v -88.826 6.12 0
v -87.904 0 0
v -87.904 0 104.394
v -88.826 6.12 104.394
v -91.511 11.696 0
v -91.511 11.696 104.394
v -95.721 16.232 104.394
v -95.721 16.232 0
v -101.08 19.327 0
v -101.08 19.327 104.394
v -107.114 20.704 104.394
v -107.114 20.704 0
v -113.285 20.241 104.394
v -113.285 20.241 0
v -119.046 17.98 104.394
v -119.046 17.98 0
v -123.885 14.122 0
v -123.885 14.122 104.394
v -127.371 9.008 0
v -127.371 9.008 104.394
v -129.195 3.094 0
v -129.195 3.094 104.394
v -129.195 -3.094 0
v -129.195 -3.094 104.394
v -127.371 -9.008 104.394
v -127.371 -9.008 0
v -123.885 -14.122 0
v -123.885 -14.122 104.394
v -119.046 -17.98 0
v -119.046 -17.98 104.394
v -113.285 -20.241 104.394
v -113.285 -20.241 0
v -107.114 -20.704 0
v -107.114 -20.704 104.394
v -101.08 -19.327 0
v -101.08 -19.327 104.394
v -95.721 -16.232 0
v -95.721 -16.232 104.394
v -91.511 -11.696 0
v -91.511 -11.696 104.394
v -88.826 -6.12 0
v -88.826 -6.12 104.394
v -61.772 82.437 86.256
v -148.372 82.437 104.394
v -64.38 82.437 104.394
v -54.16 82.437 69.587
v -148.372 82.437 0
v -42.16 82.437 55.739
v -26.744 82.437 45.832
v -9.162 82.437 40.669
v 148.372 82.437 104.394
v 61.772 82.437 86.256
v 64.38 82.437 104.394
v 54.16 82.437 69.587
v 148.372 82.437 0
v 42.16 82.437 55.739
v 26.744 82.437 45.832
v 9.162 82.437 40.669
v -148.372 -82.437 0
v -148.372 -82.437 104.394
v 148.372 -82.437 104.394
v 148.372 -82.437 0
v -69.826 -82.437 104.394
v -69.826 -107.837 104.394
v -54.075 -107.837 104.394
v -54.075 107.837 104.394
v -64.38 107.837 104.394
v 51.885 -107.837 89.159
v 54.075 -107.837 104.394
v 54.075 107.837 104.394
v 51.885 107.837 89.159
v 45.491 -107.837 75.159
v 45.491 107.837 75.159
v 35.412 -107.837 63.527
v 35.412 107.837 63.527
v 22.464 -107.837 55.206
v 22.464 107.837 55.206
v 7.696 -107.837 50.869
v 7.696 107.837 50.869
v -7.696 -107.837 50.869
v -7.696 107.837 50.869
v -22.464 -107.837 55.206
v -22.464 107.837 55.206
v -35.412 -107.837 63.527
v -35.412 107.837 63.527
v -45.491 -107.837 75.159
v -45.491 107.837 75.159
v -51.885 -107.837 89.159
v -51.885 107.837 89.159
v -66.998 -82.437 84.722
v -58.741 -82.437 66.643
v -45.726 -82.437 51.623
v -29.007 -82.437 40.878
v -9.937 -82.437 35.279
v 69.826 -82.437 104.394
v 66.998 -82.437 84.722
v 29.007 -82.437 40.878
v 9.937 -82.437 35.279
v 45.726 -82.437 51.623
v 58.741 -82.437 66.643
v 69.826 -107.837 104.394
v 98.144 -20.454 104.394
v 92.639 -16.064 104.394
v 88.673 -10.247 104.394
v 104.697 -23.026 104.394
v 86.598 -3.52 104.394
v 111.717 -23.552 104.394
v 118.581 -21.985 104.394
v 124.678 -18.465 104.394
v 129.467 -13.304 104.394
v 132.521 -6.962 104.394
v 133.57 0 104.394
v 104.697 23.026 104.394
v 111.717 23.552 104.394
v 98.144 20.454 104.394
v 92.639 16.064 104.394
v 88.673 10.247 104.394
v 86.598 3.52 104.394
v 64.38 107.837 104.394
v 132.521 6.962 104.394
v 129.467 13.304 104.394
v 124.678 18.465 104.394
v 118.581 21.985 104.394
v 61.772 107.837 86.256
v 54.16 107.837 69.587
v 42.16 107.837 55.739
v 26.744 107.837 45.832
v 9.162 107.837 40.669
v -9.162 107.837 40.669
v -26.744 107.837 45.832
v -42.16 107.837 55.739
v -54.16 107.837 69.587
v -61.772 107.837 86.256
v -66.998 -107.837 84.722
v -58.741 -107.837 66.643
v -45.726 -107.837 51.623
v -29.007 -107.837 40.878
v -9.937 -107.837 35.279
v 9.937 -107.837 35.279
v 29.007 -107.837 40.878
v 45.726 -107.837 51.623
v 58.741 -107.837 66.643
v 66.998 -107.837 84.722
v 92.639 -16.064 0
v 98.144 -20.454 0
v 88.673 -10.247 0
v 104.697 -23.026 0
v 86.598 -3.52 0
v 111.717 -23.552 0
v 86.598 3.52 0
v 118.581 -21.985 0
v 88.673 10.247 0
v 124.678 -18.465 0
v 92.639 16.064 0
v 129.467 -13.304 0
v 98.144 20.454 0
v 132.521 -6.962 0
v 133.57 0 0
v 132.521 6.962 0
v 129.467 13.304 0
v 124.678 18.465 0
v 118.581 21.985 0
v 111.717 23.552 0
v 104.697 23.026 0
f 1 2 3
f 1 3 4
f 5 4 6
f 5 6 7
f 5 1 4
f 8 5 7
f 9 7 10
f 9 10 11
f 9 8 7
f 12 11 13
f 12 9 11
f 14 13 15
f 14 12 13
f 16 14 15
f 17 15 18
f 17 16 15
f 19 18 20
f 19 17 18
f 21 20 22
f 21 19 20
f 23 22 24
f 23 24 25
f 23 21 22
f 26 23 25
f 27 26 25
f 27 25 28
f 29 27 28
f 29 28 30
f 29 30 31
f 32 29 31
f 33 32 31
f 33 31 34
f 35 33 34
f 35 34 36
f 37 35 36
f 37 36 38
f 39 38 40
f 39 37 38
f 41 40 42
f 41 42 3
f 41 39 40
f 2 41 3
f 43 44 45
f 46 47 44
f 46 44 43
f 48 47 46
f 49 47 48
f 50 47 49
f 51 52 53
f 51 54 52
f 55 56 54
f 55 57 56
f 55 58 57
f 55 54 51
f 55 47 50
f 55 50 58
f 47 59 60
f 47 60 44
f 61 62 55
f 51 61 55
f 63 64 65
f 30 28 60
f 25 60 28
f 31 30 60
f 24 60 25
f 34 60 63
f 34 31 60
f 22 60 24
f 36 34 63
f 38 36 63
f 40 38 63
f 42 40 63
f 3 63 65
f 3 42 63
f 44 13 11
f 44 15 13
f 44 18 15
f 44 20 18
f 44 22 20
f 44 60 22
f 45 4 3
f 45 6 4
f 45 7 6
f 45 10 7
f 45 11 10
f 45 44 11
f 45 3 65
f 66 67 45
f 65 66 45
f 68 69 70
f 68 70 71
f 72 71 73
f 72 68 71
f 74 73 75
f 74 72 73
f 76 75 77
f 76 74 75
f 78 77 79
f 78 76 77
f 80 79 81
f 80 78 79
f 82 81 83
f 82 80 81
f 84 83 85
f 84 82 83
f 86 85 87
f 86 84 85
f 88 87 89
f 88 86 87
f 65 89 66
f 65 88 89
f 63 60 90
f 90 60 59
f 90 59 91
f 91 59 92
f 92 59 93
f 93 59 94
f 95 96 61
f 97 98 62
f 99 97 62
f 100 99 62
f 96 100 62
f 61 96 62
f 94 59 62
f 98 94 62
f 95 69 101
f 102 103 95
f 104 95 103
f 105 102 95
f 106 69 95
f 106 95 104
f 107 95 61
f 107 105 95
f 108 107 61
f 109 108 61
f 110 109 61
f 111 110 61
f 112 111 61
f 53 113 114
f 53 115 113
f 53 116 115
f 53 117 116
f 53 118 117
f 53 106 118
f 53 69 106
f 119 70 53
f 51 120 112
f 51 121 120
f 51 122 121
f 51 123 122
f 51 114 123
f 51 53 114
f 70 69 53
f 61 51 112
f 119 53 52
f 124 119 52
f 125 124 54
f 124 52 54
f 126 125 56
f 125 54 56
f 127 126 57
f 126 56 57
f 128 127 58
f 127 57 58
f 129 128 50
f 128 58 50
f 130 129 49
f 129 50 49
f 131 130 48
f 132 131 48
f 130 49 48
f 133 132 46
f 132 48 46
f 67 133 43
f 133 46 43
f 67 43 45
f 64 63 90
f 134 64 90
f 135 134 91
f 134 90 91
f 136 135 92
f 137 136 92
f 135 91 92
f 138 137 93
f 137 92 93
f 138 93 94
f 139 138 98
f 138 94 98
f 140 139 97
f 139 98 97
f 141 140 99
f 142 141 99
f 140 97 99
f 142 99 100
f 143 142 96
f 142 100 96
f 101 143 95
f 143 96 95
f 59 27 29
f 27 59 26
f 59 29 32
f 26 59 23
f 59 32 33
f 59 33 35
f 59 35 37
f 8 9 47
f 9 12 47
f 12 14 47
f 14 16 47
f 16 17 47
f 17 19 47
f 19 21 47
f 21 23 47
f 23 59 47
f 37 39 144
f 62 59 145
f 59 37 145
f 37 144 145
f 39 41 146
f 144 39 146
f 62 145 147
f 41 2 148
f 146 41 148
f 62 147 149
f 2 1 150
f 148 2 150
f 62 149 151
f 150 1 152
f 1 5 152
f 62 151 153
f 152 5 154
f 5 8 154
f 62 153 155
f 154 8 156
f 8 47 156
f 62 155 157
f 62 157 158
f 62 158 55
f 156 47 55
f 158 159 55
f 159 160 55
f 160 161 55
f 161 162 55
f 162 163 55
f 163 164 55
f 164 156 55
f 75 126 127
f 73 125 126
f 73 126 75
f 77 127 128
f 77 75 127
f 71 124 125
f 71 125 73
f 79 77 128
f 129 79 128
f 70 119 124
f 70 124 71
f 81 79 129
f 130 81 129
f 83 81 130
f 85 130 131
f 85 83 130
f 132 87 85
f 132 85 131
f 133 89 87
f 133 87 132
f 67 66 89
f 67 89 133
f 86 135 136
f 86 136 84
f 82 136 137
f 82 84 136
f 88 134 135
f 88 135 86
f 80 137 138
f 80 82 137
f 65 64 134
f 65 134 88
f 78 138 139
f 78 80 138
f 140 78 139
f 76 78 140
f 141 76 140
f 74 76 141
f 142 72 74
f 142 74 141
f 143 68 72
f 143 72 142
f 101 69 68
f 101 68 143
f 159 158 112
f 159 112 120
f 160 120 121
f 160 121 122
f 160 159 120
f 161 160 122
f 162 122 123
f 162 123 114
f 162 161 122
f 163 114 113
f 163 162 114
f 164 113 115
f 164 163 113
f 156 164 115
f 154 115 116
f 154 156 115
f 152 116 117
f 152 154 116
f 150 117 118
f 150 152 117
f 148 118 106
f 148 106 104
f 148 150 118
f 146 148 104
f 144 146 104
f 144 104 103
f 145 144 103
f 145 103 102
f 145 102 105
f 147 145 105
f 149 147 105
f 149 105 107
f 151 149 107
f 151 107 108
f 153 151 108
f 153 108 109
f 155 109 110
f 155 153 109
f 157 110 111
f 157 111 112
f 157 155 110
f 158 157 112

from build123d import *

# Parameters (mm, degrees)
F0_W     = 296.7444360256
F0_H     = 164.8739129305
F0_R     = 20.7617734551
F0_R_2   = 23.6179830604
F1_DEPTH = 104.394
F3_DEPTH = 25.4
F5_DEPTH = 25.4
F6_DEPTH = 237.998


with BuildPart() as f1:
    # F0 (on Top) → F1 (new body)
    with BuildSketch(Plane.XY):
        Rectangle(F0_W, F0_H)
        with Locations((-108.6655110121, 0)):
            Circle(F0_R, mode=Mode.SUBTRACT)
        with Locations((109.9524945021, 0)):
            Circle(F0_R_2, mode=Mode.SUBTRACT)
    extrude(amount=F1_DEPTH)

    # F2 (on face) → F3 (join)
    with BuildSketch(Plane.XZ.offset(82.4369564652)):
        with BuildLine():
            ThreePointArc((-69.8260508727, 104.394), (0, 34.5679491273), (69.8260508727, 104.394))
            Line((69.8260508727, 104.394), (54.0751636947, 104.394))
            ThreePointArc((54.0751636947, 104.394), (0, 50.3188363053), (-54.0751636947, 104.394))
            Line((-54.0751636947, 104.394), (-69.8260508727, 104.394))
        make_face()
    extrude(amount=F3_DEPTH)

    # F4 (on face) → F5 (join)
    with BuildSketch(Plane(origin=(0, 82.4369564652, 0), x_dir=(-1, 0, 0), z_dir=(0, 1, 0))):
        with BuildLine():
            Line((64.3801944151, 104.394), (53.3518843102, 104.394))
            ThreePointArc((53.3518843102, 104.394), (0, 51.0421156898), (-53.3518843102, 104.394))
            Line((-53.3518843102, 104.394), (-64.3801944151, 104.394))
            ThreePointArc((-64.3801944151, 104.394), (0, 40.0138055849), (64.3801944151, 104.394))
        make_face()
    extrude(amount=F5_DEPTH)

    # F6 (cut): a face of the model
    f6_faces = [f1.faces().sort_by_distance(p)[0] for p in [
        (0, -82.4369564652, 81.443787732),
    ]]
    extrude(f6_faces, amount=-F6_DEPTH, mode=Mode.SUBTRACT)


solid = f1.part
